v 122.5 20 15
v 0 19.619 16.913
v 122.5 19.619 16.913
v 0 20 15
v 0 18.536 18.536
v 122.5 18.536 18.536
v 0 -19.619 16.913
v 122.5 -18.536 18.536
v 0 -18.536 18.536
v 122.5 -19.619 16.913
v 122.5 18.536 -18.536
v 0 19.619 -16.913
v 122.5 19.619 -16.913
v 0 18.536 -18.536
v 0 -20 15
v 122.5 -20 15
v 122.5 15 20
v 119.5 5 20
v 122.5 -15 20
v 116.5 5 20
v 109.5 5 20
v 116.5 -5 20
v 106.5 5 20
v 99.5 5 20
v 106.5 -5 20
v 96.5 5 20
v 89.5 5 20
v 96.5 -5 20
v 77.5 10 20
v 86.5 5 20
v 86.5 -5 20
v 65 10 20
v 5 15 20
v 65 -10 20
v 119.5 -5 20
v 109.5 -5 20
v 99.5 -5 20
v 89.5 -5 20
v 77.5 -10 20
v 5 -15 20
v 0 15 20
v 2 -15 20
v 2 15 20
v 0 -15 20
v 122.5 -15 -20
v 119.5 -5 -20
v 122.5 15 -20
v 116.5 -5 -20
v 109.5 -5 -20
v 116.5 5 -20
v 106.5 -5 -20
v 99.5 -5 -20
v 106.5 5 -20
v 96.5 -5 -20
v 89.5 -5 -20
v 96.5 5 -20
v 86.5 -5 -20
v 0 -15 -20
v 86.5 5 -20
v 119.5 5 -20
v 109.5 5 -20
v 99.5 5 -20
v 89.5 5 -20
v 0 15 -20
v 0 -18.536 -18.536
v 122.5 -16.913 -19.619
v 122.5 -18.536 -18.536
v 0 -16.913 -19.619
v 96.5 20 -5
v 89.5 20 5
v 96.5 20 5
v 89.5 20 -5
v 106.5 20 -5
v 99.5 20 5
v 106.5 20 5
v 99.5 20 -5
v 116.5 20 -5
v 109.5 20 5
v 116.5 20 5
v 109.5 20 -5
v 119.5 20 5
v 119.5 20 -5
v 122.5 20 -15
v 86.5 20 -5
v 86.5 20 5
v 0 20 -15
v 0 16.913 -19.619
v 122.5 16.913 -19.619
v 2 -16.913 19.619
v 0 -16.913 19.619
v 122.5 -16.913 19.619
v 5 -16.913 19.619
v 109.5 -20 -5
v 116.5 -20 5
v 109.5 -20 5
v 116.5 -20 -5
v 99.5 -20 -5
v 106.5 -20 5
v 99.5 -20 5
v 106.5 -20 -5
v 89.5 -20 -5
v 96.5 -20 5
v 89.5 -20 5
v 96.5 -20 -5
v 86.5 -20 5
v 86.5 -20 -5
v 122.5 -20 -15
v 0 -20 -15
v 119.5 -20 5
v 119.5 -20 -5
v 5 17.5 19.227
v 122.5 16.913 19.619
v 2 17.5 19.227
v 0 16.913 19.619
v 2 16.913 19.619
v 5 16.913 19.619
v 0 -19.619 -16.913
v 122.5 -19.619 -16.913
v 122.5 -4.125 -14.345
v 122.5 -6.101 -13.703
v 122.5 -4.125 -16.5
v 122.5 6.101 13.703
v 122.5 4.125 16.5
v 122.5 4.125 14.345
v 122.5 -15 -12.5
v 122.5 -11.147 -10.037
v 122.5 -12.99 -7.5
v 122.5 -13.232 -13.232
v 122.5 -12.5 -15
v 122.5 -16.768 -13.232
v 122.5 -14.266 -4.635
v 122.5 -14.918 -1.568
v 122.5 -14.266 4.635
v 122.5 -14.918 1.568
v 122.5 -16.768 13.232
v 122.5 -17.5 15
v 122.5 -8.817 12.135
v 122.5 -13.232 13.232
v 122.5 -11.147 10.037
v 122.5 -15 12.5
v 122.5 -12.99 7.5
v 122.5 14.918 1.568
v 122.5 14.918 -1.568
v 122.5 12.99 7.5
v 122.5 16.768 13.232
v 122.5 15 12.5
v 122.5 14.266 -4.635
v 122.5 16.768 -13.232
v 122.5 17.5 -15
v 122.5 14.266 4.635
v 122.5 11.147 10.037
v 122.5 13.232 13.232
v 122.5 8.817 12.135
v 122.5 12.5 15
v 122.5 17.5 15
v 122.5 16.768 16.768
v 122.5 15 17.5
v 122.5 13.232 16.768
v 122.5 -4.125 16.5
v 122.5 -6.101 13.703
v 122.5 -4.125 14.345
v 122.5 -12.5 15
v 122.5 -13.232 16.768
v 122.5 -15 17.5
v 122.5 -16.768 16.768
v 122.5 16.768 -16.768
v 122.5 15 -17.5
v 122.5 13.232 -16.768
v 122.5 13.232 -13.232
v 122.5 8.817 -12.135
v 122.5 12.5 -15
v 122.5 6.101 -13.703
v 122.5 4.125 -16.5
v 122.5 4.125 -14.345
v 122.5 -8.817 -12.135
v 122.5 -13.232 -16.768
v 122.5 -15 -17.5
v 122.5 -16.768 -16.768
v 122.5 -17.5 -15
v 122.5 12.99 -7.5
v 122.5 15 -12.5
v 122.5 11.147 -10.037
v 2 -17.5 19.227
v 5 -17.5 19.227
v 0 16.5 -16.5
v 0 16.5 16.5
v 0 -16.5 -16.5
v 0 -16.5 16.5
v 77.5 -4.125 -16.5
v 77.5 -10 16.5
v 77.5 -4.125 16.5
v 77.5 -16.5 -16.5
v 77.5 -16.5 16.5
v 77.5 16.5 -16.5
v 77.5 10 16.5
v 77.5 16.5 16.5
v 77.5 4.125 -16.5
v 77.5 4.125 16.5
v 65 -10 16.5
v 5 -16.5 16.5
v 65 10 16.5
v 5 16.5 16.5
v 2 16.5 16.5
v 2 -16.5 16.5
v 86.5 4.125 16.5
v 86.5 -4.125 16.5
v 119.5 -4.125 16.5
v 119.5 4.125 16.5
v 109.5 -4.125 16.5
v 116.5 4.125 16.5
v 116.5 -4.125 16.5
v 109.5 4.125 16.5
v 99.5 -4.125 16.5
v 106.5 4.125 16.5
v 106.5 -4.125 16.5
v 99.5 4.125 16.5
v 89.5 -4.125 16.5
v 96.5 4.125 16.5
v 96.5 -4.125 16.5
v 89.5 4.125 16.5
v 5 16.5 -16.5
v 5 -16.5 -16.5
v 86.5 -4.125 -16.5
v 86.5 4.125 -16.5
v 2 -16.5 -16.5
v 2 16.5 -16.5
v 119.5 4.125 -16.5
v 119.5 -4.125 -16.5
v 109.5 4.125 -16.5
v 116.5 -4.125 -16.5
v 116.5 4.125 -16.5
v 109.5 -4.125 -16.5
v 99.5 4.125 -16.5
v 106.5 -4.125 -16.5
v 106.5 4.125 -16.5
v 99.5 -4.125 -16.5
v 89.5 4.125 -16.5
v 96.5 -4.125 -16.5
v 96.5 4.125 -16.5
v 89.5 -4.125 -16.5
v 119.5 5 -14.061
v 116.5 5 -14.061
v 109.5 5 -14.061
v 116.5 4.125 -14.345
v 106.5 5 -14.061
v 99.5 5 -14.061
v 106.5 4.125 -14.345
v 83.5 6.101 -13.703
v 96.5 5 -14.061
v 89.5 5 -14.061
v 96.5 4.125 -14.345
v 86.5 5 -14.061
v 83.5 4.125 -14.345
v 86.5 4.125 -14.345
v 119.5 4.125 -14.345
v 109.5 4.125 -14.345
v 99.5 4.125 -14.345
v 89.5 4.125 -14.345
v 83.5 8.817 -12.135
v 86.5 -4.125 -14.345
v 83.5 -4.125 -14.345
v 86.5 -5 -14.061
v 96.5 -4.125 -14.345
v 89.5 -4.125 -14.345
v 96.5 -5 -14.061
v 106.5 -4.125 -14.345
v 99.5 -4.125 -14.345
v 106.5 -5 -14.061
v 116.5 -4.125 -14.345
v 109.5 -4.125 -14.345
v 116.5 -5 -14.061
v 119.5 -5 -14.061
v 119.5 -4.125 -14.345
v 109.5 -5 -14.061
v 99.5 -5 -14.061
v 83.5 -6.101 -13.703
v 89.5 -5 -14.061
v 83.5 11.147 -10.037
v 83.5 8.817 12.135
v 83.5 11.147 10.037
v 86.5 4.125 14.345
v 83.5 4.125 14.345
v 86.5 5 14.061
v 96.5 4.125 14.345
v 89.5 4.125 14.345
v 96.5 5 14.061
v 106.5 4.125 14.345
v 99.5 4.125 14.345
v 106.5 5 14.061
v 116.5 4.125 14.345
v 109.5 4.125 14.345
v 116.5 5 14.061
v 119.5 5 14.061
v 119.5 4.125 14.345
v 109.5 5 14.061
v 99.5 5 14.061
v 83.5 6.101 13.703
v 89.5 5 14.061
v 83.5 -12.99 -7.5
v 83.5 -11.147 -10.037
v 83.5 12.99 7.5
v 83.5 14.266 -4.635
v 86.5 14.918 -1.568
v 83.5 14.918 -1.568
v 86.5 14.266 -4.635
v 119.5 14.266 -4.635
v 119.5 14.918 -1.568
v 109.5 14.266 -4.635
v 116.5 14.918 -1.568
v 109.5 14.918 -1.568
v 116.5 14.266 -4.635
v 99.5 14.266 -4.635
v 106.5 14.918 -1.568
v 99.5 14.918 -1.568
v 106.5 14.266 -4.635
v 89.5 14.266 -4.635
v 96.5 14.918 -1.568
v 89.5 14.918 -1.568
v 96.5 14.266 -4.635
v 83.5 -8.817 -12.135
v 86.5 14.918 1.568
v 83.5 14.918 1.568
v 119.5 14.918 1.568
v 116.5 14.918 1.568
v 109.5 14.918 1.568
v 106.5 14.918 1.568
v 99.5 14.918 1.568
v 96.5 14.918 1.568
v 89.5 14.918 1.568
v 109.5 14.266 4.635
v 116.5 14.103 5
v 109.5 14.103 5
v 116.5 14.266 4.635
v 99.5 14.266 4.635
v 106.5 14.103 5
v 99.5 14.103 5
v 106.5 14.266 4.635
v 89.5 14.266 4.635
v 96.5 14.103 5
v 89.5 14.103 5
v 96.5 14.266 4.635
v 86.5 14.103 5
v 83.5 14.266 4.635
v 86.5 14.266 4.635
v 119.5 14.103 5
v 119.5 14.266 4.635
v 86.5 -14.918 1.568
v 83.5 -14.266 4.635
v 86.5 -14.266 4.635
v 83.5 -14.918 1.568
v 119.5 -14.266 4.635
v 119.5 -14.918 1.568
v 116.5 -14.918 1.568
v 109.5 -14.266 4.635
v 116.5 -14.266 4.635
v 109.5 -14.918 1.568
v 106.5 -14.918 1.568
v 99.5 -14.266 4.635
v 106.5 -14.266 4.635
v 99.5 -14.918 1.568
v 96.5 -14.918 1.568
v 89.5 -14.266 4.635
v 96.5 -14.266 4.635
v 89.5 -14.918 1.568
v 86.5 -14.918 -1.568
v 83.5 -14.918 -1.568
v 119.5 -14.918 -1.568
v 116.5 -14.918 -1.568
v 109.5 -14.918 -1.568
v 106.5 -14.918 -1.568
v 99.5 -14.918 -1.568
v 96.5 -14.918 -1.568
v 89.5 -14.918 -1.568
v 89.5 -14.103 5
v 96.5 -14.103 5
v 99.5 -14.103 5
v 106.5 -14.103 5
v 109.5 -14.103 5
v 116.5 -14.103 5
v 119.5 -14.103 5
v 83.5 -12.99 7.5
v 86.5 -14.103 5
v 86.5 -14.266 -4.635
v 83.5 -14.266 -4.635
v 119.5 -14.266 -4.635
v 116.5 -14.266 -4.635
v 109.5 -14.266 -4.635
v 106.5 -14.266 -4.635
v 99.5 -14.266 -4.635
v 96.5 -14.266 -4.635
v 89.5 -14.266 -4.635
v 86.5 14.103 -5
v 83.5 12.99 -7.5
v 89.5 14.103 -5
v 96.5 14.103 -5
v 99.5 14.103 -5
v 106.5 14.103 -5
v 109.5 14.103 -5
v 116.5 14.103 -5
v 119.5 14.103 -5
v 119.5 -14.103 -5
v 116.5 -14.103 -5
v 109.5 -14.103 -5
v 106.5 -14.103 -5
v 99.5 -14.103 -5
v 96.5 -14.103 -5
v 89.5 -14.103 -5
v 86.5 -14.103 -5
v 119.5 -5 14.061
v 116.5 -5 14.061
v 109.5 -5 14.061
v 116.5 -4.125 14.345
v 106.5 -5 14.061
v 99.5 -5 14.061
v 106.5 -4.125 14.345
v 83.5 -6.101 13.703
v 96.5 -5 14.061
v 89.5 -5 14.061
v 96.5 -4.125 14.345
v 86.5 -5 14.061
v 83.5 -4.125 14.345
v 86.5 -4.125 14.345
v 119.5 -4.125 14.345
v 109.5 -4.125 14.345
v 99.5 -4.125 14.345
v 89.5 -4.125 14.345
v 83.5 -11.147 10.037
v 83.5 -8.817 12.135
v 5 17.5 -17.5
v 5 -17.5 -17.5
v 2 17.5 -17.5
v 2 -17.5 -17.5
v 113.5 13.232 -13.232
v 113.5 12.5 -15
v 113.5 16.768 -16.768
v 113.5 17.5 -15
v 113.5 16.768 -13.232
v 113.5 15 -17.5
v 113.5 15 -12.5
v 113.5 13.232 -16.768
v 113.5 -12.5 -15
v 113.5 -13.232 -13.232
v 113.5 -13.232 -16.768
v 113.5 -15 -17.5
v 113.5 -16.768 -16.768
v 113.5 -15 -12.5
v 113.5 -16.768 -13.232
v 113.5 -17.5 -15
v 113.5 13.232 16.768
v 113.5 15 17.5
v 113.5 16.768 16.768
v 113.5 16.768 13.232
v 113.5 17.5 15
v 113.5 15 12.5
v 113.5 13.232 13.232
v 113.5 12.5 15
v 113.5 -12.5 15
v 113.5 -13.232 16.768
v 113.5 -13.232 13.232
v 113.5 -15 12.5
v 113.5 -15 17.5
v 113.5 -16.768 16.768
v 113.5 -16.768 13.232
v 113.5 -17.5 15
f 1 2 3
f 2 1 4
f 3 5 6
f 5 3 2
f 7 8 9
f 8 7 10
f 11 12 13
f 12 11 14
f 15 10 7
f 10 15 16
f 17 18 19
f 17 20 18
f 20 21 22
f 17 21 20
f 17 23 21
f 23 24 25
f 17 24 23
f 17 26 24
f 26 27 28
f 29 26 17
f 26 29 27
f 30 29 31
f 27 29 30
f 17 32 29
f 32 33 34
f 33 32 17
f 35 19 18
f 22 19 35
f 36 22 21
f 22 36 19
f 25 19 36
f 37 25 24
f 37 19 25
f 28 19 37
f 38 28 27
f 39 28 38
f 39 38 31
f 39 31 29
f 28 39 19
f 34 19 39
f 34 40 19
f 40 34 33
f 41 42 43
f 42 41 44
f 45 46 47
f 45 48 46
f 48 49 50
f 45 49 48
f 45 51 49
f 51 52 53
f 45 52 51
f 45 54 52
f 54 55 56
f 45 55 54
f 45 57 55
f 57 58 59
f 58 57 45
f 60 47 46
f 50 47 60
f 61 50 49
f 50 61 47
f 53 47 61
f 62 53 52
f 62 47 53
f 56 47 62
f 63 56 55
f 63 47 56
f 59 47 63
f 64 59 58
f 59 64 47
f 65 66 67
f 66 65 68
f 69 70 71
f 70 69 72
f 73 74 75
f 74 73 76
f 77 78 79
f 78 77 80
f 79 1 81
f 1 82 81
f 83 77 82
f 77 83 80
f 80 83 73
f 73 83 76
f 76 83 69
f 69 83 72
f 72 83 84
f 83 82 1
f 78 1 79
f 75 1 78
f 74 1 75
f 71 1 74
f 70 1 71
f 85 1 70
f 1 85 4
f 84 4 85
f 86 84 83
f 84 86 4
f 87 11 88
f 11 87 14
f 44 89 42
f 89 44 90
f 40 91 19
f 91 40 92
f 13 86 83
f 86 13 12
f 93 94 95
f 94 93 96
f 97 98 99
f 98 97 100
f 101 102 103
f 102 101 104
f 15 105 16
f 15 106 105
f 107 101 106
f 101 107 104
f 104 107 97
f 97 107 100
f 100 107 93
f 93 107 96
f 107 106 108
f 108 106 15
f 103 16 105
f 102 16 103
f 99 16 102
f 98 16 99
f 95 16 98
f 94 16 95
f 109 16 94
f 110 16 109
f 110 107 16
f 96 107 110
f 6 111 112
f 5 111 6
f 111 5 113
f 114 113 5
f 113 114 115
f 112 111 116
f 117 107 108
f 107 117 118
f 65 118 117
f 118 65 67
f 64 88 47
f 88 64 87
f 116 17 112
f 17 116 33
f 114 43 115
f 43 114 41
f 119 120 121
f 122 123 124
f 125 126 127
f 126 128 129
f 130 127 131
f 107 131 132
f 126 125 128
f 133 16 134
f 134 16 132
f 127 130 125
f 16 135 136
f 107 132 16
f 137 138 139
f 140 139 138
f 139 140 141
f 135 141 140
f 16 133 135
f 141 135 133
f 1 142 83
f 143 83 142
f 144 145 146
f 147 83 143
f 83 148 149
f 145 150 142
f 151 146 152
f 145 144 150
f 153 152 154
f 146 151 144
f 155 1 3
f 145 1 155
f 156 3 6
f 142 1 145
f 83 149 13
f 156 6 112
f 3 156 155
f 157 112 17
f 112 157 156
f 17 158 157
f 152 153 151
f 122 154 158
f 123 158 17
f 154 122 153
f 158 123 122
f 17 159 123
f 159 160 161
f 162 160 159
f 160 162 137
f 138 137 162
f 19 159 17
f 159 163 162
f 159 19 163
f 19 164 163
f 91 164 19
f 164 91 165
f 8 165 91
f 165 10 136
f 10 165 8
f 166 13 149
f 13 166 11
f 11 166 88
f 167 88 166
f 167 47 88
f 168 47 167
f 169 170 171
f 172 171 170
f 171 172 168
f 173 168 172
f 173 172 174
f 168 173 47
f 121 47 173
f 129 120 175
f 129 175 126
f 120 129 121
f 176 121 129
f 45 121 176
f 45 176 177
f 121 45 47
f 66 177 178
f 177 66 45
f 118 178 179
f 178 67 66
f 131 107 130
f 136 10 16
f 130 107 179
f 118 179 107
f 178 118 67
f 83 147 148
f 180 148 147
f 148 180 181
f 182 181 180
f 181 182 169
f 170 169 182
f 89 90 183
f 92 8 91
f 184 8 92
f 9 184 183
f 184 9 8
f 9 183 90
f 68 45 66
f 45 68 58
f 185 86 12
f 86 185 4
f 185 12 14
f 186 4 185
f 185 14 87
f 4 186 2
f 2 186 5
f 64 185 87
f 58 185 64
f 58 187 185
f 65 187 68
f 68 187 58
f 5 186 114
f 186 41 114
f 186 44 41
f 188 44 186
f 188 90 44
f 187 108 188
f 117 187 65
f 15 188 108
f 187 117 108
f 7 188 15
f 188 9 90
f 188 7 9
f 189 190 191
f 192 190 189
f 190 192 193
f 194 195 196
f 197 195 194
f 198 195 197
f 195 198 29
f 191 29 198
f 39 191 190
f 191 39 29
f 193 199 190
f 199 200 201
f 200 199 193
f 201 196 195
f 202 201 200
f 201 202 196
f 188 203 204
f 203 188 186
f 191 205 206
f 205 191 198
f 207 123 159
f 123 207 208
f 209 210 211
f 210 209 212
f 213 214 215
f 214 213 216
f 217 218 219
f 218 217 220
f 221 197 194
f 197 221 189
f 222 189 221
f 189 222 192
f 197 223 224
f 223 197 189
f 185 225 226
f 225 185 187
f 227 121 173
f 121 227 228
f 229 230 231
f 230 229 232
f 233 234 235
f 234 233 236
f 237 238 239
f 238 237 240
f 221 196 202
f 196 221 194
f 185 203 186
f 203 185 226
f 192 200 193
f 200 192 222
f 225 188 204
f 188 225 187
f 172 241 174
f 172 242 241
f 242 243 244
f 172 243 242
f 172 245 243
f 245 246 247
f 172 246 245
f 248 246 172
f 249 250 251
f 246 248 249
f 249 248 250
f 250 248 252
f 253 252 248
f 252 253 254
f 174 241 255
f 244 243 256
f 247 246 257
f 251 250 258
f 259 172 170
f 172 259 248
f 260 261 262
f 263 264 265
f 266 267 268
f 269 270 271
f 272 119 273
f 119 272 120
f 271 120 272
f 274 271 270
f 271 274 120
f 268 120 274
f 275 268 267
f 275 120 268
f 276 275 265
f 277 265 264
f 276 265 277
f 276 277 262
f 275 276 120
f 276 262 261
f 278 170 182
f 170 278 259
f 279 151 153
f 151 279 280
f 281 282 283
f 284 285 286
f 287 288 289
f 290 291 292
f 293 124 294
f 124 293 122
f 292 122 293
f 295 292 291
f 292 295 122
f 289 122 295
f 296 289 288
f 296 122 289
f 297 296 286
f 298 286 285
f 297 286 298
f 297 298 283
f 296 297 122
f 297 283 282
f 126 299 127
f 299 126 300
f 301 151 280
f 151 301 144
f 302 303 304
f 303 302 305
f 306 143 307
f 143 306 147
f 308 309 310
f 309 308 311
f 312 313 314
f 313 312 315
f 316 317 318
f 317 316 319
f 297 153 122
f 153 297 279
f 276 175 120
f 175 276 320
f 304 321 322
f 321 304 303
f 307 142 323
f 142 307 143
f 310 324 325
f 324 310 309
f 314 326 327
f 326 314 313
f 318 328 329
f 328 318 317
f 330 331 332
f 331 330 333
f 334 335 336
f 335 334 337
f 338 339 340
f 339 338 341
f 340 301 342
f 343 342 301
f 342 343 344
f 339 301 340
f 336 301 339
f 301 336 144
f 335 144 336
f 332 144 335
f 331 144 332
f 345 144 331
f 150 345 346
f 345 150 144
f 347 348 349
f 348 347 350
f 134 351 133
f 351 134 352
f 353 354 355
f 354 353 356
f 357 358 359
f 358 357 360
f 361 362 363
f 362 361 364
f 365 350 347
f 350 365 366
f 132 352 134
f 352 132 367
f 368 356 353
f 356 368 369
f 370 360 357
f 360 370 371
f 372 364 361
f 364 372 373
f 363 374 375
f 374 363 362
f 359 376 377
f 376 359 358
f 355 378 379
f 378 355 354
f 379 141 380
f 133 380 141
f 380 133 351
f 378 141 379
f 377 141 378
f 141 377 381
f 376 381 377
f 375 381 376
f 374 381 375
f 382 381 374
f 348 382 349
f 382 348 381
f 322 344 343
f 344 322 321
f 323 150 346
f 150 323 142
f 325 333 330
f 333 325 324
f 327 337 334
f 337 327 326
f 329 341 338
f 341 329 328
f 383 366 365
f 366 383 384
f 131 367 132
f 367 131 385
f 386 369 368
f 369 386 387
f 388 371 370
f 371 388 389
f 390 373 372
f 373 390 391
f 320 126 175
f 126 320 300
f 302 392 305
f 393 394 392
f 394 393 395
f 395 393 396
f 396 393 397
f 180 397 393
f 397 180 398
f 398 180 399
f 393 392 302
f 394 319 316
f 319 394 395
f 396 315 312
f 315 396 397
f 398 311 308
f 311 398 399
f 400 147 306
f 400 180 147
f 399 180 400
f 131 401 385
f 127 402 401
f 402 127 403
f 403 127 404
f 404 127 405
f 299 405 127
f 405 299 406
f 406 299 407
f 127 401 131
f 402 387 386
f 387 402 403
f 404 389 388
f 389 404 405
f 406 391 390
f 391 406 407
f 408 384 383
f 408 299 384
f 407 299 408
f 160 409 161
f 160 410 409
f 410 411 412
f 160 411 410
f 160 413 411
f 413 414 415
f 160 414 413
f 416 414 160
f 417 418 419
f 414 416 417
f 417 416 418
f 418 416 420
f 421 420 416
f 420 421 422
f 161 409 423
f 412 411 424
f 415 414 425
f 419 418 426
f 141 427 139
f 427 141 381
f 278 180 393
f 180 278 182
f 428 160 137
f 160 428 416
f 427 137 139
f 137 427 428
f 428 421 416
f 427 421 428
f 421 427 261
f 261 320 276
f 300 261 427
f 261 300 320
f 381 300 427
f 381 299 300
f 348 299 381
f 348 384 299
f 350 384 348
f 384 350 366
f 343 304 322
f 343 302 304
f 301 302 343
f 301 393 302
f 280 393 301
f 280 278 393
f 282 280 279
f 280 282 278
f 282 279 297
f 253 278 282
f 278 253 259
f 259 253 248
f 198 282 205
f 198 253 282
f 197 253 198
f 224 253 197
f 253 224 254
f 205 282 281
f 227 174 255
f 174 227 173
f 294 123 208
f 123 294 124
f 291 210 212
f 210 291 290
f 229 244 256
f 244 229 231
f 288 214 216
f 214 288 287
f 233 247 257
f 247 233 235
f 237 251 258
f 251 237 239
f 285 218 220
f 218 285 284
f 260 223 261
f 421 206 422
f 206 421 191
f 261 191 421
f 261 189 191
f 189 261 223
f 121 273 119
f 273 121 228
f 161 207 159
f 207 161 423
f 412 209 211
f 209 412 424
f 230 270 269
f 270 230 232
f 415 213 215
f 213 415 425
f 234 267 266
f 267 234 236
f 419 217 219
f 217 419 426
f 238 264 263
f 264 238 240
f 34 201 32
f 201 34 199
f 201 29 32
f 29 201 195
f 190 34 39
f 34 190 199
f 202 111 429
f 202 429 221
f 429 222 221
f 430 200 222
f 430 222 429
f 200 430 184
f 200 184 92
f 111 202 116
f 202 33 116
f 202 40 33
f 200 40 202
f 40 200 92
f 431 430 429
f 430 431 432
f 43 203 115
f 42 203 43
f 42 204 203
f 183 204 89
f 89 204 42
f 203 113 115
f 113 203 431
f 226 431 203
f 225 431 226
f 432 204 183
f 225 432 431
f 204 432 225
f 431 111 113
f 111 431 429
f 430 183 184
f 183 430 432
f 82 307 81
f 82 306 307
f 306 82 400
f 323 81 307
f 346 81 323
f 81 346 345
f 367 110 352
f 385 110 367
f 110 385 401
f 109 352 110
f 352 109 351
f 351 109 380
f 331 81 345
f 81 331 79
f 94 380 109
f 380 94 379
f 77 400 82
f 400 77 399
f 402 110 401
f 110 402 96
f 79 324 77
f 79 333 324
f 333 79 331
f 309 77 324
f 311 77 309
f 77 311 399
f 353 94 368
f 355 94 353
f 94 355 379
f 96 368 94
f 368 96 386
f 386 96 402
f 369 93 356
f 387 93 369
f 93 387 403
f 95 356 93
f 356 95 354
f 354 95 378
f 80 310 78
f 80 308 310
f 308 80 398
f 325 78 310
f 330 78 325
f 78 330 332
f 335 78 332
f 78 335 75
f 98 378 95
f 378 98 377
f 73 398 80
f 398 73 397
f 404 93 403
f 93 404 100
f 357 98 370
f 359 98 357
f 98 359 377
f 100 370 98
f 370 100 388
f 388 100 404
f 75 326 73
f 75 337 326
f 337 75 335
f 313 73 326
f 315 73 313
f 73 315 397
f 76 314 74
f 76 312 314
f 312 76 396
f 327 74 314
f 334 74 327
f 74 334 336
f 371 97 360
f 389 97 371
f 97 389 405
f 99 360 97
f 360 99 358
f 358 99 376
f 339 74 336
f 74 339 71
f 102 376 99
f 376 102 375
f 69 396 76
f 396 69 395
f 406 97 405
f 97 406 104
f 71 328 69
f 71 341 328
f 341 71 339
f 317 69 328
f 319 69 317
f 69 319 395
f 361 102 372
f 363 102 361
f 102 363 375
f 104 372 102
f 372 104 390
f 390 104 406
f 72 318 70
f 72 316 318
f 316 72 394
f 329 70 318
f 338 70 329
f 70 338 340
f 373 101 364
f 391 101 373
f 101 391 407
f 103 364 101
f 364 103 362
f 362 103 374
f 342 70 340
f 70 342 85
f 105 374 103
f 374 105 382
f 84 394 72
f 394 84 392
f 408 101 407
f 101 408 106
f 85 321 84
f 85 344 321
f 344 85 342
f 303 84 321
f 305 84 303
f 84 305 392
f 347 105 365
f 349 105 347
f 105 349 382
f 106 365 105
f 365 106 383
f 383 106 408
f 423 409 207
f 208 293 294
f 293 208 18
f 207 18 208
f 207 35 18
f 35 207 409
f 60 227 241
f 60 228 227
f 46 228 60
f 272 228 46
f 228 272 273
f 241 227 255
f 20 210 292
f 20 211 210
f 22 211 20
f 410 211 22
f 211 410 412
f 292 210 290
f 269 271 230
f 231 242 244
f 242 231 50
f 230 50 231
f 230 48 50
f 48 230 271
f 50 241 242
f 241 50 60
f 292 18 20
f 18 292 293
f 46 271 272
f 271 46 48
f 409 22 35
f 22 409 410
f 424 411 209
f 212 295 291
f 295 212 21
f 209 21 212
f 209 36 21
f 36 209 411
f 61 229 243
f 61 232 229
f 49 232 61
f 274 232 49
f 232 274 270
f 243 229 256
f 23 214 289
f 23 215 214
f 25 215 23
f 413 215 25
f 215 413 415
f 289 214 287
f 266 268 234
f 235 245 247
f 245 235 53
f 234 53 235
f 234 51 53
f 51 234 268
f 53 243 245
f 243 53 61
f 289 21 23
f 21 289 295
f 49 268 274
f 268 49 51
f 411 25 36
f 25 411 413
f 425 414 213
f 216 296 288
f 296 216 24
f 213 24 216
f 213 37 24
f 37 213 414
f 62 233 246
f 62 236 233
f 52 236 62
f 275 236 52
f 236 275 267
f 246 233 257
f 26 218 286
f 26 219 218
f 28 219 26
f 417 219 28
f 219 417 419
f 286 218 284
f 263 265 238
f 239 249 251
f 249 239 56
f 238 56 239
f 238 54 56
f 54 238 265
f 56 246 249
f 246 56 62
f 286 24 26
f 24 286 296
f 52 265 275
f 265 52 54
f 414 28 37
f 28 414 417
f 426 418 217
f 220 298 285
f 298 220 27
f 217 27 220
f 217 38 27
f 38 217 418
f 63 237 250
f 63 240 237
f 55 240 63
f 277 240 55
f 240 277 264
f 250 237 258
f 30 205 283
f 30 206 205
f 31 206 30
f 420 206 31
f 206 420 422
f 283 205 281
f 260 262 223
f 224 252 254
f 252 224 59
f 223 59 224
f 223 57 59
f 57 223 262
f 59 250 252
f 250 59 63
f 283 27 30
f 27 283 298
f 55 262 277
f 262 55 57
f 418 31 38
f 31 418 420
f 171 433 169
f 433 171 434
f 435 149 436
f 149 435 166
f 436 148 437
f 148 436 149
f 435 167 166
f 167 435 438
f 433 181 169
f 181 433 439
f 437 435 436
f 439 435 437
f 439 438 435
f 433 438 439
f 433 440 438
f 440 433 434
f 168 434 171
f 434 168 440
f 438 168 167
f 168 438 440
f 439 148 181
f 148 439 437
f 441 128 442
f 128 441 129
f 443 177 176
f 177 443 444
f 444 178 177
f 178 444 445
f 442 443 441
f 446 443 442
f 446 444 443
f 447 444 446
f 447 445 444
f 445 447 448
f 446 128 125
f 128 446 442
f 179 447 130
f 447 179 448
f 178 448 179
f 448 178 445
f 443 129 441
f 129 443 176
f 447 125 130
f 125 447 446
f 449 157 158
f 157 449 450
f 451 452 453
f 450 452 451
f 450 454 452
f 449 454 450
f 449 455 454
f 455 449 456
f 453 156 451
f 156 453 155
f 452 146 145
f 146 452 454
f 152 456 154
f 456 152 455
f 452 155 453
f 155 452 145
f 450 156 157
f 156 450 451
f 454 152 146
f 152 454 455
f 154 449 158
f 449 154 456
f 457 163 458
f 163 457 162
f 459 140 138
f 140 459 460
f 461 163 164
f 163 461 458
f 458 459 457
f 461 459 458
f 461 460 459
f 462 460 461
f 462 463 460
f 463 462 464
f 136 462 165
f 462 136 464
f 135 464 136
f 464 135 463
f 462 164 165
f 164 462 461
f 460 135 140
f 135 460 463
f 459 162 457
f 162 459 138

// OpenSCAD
//How long is your motor (mm)?
depth_motor = 40;
//What is the diameter of your motor(mm)?
dia_motor = 30;

//What is the width of your switch(mm)?
width_button = 12.5;
//What is the length of your switch(mm)?
length_button = 20;

//What is the width of your battery holder(mm)?
width_battery = 33;
//What is the length of your battery holder(mm)?
length_battery = 33;
//What is the height of your battery holder (how long is it)(mm)?
depth_battery = 60;


overall_length = depth_battery+depth_motor+width_button+10;

difference(){

hull(){
rotate([0,90,0])translate([-15,-15,0])cylinder(r = 5, h = overall_length, center = false);
rotate([0,90,0])translate([+15,-15,0])cylinder(r = 5, h = overall_length, center = false);
rotate([0,90,0])translate([-15,+15,0])cylinder(r = 5, h = overall_length, center = false);
rotate([0,90,0])translate([+15,+15,0])cylinder(r = 5, h = overall_length, center = false);
}

//minus
translate([-1,-width_battery/2,-length_battery/2])cube([depth_battery+width_button+6,width_battery,length_battery]);

rotate([0,90,0])translate([0,0,overall_length-depth_motor+1])cylinder(r = dia_motor/2, h = depth_motor, center = false);

translate([depth_battery+5,-width_battery/8,-length_battery/2])cube([depth_battery+5,width_battery/4,length_battery]);

translate([depth_battery+5,-length_button/2,1])cube([width_button,length_button,20]);

translate([2,-17.5,-17.5])cube([3,35,40]);

translate([overall_length-6,-25,-5])cube([3,50,10]);
translate([overall_length-16,-25,-5])cube([3,50,10]);
translate([overall_length-26,-25,-5])cube([3,50,10]);
translate([overall_length-36,-25,-5])cube([3,50,10]);

translate([overall_length-6,-5,-25])cube([3,10,50]);
translate([overall_length-16,-5,-25])cube([3,10,50]);
translate([overall_length-26,-5,-25])cube([3,10,50]);
translate([overall_length-36,-5,-25])cube([3,10,50]);

rotate([0,90,0])translate([15,15,overall_length-9])cylinder(r = 2.5, h = 10, center = false);
rotate([0,90,0])translate([15,-15,overall_length-9])cylinder(r = 2.5, h = 10, center = false);
rotate([0,90,0])translate([-15,15,overall_length-9])cylinder(r = 2.5, h = 10, center = false);
rotate([0,90,0])translate([-15,-15,overall_length-9])cylinder(r = 2.5, h = 10, center = false);
}
